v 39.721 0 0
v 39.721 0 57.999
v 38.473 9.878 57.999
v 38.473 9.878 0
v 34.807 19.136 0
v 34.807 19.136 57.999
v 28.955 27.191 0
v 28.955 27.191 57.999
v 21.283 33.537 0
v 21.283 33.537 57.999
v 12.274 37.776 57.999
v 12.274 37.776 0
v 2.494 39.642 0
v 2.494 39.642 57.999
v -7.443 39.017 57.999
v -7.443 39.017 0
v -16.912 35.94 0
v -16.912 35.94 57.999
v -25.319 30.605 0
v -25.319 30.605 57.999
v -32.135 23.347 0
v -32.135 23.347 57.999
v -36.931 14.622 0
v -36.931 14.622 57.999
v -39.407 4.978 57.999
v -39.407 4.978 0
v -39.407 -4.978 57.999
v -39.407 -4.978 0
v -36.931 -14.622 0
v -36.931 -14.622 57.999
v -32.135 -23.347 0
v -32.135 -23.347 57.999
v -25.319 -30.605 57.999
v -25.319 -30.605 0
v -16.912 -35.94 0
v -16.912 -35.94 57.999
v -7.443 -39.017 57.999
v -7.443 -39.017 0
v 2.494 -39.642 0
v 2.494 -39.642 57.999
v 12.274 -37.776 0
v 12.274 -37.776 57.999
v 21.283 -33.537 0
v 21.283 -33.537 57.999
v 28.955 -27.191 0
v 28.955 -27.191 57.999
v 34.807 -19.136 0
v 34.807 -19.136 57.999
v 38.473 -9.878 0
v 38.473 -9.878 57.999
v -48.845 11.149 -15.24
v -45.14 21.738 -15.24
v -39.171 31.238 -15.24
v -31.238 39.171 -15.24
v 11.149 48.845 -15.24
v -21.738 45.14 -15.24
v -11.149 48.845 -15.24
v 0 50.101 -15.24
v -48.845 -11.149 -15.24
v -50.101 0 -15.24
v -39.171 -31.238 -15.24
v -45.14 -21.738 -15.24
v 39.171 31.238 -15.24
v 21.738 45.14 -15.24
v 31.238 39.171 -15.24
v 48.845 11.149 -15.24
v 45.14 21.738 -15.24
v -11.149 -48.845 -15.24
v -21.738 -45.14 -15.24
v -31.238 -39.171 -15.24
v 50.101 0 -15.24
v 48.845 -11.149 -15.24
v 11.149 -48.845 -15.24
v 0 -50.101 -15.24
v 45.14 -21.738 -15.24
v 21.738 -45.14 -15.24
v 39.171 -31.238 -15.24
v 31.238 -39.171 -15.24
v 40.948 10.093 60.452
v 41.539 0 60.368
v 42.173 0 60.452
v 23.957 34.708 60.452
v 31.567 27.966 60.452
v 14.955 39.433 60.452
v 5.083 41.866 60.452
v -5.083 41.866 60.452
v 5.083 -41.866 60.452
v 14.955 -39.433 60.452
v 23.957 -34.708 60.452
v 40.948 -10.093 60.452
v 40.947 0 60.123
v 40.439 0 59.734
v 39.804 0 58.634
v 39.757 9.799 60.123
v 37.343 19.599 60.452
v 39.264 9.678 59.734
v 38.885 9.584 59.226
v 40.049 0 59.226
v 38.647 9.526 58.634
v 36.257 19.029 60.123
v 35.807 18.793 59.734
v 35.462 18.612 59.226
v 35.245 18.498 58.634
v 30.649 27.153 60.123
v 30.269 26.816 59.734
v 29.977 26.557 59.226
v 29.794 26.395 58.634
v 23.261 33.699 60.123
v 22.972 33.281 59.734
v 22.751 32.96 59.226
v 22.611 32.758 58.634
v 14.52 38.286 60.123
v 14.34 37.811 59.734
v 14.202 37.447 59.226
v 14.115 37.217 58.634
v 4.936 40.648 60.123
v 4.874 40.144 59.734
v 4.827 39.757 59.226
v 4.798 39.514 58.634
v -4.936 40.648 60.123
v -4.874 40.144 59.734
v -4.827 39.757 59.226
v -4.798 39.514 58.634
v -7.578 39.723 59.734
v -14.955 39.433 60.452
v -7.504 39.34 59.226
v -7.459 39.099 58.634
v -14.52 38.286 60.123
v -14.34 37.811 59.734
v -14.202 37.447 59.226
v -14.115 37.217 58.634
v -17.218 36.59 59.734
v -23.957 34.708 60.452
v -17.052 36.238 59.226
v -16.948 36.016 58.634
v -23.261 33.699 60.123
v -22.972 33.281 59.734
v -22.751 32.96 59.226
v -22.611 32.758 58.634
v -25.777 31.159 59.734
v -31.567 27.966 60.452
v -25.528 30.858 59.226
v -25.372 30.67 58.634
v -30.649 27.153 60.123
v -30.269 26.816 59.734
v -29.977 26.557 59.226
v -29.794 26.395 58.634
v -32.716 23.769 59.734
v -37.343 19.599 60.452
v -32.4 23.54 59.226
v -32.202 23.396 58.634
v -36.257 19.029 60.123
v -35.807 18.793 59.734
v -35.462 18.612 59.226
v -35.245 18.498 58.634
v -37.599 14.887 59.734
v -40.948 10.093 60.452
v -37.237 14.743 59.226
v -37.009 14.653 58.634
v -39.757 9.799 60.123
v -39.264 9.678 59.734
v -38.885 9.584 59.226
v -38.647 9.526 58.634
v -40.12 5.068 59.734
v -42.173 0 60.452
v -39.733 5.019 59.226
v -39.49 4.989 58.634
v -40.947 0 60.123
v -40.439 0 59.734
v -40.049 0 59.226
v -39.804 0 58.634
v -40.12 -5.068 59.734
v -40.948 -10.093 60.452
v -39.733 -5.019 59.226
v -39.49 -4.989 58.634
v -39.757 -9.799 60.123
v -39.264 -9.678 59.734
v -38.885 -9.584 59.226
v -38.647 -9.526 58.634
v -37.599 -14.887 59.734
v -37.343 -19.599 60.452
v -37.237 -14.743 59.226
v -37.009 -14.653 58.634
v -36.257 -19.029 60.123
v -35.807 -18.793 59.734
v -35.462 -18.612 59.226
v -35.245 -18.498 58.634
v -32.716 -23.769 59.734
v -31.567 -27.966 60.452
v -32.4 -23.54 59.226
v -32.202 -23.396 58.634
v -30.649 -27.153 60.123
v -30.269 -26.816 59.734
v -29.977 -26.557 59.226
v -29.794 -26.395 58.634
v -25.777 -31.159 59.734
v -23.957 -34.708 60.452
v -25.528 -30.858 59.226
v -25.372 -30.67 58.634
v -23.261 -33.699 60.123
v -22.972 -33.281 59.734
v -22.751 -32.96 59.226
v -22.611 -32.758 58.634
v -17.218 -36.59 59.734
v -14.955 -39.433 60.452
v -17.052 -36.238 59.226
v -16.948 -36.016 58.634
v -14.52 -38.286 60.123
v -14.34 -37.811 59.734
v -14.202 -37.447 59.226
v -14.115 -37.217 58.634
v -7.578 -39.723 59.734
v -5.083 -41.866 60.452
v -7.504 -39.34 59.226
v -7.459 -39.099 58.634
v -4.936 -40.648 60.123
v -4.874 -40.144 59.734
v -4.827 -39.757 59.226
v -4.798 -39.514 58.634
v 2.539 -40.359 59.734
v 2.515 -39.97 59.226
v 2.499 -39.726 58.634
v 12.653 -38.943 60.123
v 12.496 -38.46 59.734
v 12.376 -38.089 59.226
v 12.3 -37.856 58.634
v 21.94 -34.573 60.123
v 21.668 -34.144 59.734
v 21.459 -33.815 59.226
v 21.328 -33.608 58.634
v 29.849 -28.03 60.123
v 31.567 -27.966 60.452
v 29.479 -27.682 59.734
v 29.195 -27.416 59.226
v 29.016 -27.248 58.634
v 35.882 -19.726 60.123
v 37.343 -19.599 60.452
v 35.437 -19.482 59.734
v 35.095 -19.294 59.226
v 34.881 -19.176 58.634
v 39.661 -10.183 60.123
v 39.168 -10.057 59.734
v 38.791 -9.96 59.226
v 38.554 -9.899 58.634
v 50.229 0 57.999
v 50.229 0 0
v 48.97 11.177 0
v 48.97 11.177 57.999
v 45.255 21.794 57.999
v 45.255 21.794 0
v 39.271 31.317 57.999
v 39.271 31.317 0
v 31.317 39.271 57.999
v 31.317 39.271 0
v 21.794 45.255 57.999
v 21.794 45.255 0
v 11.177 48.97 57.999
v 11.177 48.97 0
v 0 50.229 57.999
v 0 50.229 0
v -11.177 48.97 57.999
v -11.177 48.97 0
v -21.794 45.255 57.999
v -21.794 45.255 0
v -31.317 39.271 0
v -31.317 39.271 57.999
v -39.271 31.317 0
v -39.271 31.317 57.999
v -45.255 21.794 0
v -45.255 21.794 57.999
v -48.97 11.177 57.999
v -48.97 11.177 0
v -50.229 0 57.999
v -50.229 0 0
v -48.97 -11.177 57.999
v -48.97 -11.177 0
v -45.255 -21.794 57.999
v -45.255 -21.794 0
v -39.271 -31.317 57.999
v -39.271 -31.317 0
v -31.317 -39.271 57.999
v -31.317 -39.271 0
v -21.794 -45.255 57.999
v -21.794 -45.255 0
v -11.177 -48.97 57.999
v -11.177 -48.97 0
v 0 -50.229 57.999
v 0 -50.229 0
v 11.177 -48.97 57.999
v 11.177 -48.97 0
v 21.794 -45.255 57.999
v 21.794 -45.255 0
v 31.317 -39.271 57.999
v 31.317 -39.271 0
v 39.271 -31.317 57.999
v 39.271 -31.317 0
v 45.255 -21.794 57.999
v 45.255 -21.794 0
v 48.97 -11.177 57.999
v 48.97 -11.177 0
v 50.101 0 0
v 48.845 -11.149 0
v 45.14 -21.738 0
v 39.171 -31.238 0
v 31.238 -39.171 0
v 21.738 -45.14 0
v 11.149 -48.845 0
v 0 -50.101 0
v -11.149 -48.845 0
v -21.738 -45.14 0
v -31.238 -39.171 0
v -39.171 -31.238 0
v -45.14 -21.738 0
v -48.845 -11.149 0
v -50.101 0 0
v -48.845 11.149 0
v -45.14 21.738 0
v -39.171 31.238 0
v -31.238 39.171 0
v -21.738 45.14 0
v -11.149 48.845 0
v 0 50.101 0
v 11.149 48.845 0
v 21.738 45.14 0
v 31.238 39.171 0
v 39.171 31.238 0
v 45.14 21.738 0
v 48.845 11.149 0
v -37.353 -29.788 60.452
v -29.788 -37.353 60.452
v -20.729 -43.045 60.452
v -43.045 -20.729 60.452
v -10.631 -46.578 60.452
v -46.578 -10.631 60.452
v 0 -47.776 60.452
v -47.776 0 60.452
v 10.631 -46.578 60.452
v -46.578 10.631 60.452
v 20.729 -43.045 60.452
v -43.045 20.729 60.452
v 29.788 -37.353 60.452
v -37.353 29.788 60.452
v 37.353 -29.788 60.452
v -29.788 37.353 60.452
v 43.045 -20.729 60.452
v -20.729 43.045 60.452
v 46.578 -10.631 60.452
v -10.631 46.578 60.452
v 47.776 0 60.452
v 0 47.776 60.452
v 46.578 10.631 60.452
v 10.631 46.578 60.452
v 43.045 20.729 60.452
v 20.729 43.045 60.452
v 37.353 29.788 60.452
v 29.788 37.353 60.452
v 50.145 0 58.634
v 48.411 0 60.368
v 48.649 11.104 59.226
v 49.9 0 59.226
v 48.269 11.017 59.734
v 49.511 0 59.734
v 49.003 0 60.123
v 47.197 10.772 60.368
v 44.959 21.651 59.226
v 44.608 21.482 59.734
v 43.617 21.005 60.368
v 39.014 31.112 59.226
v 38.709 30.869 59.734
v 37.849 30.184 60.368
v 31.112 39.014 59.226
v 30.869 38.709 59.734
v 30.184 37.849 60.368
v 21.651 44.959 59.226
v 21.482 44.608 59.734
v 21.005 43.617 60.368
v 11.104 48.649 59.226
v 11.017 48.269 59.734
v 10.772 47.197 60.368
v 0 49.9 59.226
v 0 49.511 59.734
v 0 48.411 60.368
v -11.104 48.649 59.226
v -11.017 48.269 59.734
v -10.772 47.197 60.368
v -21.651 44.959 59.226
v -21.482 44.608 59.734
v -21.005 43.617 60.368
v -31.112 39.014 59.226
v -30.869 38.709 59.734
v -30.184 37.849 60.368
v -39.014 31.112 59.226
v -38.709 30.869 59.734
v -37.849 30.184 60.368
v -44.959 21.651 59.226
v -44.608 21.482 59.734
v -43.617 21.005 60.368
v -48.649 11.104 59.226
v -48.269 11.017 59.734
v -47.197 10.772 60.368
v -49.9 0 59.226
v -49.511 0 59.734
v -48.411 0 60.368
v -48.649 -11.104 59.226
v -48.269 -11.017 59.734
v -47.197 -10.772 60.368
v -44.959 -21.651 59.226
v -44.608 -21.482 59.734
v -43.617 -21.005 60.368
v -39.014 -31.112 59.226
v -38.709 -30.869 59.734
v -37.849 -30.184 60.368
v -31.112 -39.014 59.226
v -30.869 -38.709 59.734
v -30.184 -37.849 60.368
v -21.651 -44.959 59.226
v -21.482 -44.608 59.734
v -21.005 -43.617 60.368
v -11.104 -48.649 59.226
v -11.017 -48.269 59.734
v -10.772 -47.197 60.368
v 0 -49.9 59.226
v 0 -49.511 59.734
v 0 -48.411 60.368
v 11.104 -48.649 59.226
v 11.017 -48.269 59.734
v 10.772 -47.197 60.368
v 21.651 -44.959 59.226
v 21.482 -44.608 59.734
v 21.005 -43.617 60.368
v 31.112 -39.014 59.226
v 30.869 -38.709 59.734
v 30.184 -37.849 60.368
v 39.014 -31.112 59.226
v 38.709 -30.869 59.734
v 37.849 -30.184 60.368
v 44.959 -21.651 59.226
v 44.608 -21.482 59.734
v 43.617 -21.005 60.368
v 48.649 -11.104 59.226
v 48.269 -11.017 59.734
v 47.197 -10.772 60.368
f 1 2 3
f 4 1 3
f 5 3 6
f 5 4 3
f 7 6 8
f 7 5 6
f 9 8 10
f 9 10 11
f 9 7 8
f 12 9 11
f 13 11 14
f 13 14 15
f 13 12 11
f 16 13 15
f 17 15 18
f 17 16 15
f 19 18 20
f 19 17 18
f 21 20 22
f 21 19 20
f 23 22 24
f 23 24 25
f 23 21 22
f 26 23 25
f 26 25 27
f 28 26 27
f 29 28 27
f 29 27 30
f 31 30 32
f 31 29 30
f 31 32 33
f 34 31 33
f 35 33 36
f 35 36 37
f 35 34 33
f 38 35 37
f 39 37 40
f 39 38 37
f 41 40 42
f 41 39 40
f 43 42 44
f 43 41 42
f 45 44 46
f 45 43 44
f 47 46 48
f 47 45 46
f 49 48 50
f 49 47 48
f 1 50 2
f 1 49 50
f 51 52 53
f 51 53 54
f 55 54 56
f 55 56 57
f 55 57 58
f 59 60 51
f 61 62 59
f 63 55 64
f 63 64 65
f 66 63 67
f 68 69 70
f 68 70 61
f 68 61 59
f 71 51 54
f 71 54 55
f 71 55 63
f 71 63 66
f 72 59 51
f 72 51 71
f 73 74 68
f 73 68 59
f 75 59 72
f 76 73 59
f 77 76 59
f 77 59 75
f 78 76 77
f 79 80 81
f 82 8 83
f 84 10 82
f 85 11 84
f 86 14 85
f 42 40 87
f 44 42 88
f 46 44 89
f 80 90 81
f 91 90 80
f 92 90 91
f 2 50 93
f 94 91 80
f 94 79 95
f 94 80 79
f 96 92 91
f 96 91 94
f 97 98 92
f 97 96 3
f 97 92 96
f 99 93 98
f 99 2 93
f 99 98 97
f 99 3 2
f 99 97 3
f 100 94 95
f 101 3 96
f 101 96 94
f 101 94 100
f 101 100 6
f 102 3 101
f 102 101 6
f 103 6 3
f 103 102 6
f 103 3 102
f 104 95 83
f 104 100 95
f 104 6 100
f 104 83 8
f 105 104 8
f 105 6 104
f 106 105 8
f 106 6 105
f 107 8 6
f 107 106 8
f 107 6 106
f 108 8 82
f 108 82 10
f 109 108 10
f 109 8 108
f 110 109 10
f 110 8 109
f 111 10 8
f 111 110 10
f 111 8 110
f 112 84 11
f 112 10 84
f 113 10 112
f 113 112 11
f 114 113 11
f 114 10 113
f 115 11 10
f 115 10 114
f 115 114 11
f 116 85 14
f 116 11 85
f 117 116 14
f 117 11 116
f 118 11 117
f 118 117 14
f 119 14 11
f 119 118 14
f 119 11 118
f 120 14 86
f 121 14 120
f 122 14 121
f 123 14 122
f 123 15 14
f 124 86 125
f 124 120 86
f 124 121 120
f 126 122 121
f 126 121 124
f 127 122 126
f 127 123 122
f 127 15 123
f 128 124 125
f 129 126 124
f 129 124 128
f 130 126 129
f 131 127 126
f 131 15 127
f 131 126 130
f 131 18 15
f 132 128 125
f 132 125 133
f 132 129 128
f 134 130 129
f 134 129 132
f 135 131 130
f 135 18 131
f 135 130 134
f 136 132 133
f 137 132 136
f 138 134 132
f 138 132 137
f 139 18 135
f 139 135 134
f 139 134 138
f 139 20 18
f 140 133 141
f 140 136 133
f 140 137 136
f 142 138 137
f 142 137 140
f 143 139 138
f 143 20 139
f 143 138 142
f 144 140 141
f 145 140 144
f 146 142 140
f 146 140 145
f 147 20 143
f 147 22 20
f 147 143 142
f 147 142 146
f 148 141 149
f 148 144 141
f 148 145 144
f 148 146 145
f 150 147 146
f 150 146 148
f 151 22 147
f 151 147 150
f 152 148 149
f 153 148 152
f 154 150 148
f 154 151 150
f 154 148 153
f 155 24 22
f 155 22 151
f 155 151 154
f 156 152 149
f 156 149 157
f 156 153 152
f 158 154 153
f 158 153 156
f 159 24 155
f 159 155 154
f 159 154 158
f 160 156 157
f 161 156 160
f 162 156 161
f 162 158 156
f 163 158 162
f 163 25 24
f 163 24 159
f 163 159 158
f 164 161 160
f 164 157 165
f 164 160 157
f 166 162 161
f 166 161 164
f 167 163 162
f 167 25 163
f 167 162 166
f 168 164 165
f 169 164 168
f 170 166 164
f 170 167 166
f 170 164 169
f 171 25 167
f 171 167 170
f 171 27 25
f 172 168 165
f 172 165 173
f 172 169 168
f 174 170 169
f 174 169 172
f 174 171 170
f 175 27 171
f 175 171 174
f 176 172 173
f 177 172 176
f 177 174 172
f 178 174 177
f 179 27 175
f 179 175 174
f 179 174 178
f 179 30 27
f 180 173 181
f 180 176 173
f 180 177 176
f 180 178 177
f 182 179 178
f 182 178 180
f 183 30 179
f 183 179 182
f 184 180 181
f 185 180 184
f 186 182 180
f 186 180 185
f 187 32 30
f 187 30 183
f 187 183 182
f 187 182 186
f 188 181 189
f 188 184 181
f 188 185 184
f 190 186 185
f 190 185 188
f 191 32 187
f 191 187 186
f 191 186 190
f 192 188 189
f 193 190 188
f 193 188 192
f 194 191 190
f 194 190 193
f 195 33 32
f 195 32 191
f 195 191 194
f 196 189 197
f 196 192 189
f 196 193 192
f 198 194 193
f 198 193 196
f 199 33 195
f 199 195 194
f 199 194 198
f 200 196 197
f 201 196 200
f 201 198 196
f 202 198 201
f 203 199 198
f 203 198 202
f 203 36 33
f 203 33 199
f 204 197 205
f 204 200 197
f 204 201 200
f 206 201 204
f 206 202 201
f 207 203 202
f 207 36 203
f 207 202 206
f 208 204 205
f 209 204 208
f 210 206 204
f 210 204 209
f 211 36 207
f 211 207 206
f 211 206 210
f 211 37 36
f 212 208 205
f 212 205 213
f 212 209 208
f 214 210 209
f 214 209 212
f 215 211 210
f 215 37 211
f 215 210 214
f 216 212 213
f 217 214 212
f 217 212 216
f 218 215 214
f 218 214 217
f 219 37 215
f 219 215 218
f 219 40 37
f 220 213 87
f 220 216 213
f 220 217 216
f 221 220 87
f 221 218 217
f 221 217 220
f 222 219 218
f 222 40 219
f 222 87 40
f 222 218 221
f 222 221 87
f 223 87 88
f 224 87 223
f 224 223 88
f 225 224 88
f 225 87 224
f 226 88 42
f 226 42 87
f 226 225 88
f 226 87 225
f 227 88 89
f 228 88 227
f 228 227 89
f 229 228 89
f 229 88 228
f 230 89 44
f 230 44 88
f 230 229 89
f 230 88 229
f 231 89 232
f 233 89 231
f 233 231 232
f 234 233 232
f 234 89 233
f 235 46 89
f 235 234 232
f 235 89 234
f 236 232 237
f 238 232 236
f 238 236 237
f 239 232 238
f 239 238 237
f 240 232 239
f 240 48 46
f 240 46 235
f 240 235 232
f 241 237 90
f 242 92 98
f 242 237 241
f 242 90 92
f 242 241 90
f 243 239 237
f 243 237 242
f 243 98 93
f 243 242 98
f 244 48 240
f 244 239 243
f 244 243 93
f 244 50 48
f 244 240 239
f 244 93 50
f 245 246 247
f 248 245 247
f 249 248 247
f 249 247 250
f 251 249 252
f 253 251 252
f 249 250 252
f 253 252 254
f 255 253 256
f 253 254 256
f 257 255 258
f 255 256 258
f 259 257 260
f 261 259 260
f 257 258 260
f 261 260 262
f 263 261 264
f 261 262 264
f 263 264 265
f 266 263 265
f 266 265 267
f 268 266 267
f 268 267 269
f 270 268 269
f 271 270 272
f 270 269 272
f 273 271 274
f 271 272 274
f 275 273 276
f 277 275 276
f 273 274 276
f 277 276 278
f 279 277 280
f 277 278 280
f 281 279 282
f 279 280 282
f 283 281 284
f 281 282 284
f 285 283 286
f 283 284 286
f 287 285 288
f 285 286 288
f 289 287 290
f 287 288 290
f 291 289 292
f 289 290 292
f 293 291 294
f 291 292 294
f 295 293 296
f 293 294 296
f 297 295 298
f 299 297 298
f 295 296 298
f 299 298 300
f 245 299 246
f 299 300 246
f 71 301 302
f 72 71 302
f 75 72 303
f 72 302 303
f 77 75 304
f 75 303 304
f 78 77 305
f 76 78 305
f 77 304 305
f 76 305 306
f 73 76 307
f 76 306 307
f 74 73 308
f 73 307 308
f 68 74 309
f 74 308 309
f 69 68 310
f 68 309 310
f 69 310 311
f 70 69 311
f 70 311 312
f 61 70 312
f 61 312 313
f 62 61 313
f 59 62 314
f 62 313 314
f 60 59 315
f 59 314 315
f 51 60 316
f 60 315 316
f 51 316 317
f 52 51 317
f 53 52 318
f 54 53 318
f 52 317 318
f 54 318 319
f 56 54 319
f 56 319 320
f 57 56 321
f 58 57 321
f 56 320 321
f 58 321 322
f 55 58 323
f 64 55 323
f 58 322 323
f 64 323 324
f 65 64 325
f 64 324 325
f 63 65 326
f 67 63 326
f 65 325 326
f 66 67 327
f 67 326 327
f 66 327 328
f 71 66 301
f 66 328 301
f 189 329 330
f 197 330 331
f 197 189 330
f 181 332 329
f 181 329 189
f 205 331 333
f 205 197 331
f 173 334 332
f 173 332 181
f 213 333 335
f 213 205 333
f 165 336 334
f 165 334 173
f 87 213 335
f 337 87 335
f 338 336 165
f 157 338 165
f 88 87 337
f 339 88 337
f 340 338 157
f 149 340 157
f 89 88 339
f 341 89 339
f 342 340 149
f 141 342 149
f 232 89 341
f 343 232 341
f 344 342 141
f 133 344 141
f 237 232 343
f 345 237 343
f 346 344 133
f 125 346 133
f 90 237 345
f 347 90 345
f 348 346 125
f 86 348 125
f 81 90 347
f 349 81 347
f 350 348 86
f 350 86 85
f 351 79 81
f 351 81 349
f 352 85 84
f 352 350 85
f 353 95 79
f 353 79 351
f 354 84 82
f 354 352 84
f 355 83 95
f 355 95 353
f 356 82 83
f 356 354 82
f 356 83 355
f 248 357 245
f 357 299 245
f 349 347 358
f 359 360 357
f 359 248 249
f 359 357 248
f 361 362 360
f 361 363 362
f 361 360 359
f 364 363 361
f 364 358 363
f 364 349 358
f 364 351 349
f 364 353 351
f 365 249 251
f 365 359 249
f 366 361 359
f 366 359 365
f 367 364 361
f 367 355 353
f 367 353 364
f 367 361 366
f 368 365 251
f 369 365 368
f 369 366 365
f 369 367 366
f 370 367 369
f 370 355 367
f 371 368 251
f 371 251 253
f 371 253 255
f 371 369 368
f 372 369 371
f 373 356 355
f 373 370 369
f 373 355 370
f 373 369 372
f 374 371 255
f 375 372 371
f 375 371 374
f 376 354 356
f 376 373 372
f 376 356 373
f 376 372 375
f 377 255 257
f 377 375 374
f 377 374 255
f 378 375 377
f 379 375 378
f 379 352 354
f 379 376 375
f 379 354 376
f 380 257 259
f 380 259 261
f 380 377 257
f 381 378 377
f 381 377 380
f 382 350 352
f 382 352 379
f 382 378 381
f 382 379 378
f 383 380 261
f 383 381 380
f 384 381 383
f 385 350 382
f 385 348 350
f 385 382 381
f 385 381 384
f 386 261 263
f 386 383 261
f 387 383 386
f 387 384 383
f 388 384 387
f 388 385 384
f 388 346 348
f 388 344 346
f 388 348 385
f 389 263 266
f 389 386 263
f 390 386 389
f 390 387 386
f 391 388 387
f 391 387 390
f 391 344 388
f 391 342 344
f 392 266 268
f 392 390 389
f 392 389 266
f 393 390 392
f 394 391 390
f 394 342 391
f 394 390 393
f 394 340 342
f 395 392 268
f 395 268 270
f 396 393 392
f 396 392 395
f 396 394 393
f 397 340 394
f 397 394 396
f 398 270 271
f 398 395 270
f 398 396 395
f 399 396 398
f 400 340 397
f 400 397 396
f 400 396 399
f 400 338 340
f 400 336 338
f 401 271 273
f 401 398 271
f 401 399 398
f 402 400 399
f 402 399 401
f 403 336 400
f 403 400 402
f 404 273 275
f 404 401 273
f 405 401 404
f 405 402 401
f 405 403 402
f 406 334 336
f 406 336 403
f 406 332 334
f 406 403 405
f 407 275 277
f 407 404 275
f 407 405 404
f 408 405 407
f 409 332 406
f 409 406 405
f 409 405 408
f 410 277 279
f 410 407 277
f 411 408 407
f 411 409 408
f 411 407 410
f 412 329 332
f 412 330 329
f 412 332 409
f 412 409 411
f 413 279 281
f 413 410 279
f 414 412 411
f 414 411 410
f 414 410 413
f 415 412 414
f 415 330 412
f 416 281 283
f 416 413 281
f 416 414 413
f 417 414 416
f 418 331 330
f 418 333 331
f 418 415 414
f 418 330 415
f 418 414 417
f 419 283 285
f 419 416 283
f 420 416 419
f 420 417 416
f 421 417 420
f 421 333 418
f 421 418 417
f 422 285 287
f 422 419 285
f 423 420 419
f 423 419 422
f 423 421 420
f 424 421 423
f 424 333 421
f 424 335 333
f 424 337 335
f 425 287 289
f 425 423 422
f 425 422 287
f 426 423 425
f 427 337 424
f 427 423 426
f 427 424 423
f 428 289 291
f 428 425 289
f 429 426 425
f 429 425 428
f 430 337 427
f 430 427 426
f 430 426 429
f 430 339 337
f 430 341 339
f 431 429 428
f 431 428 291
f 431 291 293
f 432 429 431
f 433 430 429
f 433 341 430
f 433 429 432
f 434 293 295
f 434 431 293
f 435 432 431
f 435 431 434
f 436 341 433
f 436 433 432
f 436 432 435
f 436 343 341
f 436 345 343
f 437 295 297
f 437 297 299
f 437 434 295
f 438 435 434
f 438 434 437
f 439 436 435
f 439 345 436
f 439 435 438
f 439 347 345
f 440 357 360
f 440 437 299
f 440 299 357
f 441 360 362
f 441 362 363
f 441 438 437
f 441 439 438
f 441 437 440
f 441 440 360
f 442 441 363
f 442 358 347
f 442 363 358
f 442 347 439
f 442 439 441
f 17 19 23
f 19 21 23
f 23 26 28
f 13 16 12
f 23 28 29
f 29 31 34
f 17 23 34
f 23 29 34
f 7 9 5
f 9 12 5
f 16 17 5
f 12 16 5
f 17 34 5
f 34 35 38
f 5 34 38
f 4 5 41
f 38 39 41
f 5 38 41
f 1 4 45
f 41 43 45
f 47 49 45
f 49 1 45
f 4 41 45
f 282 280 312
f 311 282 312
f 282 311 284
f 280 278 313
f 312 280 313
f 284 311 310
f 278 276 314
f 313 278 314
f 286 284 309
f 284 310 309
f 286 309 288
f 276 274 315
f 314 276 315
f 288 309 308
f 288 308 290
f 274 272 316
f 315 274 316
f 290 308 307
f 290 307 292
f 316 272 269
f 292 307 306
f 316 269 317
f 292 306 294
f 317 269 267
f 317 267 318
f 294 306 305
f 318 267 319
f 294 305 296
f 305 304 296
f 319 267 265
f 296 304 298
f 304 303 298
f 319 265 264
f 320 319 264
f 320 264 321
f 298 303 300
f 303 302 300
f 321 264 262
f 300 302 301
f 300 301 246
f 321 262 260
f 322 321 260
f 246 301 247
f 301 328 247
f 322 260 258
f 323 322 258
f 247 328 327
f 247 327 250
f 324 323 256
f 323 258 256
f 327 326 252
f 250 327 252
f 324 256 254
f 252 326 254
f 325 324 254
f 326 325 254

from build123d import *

# Parameters (mm, degrees)
F0_R     = 50.2290121712
F0_R_2   = 39.7205191913
F1_DEPTH = 60.452
F2_R     = 50.1012725797
F3_DEPTH = 15.24
F4_R     = 2.4528409794


# Not quite as in the source:
# - a feature names something its author has since deleted; it is built from what else it names


with BuildPart() as f1:
    # F0 (on Top) → F1 (new body)
    with BuildSketch(Plane.XY):
        Circle(F0_R)
        Circle(F0_R_2, mode=Mode.SUBTRACT)
    extrude(amount=F1_DEPTH)

    # F2 (on face) → F3 (join)
    with BuildSketch(Plane(origin=(0, 0, 0), x_dir=(1, 0, 0), z_dir=(0, 0, -1))):
        Circle(F2_R)
    extrude(amount=F3_DEPTH)

    # F4
    f4_edges = [f1.edges().sort_by_distance(p)[0] for p in [
        (-50.229012, 0, 60.452),
        (-39.720519, 0, 60.452),
    ]]
    fillet(f4_edges, radius=F4_R)


solid = f1.part
